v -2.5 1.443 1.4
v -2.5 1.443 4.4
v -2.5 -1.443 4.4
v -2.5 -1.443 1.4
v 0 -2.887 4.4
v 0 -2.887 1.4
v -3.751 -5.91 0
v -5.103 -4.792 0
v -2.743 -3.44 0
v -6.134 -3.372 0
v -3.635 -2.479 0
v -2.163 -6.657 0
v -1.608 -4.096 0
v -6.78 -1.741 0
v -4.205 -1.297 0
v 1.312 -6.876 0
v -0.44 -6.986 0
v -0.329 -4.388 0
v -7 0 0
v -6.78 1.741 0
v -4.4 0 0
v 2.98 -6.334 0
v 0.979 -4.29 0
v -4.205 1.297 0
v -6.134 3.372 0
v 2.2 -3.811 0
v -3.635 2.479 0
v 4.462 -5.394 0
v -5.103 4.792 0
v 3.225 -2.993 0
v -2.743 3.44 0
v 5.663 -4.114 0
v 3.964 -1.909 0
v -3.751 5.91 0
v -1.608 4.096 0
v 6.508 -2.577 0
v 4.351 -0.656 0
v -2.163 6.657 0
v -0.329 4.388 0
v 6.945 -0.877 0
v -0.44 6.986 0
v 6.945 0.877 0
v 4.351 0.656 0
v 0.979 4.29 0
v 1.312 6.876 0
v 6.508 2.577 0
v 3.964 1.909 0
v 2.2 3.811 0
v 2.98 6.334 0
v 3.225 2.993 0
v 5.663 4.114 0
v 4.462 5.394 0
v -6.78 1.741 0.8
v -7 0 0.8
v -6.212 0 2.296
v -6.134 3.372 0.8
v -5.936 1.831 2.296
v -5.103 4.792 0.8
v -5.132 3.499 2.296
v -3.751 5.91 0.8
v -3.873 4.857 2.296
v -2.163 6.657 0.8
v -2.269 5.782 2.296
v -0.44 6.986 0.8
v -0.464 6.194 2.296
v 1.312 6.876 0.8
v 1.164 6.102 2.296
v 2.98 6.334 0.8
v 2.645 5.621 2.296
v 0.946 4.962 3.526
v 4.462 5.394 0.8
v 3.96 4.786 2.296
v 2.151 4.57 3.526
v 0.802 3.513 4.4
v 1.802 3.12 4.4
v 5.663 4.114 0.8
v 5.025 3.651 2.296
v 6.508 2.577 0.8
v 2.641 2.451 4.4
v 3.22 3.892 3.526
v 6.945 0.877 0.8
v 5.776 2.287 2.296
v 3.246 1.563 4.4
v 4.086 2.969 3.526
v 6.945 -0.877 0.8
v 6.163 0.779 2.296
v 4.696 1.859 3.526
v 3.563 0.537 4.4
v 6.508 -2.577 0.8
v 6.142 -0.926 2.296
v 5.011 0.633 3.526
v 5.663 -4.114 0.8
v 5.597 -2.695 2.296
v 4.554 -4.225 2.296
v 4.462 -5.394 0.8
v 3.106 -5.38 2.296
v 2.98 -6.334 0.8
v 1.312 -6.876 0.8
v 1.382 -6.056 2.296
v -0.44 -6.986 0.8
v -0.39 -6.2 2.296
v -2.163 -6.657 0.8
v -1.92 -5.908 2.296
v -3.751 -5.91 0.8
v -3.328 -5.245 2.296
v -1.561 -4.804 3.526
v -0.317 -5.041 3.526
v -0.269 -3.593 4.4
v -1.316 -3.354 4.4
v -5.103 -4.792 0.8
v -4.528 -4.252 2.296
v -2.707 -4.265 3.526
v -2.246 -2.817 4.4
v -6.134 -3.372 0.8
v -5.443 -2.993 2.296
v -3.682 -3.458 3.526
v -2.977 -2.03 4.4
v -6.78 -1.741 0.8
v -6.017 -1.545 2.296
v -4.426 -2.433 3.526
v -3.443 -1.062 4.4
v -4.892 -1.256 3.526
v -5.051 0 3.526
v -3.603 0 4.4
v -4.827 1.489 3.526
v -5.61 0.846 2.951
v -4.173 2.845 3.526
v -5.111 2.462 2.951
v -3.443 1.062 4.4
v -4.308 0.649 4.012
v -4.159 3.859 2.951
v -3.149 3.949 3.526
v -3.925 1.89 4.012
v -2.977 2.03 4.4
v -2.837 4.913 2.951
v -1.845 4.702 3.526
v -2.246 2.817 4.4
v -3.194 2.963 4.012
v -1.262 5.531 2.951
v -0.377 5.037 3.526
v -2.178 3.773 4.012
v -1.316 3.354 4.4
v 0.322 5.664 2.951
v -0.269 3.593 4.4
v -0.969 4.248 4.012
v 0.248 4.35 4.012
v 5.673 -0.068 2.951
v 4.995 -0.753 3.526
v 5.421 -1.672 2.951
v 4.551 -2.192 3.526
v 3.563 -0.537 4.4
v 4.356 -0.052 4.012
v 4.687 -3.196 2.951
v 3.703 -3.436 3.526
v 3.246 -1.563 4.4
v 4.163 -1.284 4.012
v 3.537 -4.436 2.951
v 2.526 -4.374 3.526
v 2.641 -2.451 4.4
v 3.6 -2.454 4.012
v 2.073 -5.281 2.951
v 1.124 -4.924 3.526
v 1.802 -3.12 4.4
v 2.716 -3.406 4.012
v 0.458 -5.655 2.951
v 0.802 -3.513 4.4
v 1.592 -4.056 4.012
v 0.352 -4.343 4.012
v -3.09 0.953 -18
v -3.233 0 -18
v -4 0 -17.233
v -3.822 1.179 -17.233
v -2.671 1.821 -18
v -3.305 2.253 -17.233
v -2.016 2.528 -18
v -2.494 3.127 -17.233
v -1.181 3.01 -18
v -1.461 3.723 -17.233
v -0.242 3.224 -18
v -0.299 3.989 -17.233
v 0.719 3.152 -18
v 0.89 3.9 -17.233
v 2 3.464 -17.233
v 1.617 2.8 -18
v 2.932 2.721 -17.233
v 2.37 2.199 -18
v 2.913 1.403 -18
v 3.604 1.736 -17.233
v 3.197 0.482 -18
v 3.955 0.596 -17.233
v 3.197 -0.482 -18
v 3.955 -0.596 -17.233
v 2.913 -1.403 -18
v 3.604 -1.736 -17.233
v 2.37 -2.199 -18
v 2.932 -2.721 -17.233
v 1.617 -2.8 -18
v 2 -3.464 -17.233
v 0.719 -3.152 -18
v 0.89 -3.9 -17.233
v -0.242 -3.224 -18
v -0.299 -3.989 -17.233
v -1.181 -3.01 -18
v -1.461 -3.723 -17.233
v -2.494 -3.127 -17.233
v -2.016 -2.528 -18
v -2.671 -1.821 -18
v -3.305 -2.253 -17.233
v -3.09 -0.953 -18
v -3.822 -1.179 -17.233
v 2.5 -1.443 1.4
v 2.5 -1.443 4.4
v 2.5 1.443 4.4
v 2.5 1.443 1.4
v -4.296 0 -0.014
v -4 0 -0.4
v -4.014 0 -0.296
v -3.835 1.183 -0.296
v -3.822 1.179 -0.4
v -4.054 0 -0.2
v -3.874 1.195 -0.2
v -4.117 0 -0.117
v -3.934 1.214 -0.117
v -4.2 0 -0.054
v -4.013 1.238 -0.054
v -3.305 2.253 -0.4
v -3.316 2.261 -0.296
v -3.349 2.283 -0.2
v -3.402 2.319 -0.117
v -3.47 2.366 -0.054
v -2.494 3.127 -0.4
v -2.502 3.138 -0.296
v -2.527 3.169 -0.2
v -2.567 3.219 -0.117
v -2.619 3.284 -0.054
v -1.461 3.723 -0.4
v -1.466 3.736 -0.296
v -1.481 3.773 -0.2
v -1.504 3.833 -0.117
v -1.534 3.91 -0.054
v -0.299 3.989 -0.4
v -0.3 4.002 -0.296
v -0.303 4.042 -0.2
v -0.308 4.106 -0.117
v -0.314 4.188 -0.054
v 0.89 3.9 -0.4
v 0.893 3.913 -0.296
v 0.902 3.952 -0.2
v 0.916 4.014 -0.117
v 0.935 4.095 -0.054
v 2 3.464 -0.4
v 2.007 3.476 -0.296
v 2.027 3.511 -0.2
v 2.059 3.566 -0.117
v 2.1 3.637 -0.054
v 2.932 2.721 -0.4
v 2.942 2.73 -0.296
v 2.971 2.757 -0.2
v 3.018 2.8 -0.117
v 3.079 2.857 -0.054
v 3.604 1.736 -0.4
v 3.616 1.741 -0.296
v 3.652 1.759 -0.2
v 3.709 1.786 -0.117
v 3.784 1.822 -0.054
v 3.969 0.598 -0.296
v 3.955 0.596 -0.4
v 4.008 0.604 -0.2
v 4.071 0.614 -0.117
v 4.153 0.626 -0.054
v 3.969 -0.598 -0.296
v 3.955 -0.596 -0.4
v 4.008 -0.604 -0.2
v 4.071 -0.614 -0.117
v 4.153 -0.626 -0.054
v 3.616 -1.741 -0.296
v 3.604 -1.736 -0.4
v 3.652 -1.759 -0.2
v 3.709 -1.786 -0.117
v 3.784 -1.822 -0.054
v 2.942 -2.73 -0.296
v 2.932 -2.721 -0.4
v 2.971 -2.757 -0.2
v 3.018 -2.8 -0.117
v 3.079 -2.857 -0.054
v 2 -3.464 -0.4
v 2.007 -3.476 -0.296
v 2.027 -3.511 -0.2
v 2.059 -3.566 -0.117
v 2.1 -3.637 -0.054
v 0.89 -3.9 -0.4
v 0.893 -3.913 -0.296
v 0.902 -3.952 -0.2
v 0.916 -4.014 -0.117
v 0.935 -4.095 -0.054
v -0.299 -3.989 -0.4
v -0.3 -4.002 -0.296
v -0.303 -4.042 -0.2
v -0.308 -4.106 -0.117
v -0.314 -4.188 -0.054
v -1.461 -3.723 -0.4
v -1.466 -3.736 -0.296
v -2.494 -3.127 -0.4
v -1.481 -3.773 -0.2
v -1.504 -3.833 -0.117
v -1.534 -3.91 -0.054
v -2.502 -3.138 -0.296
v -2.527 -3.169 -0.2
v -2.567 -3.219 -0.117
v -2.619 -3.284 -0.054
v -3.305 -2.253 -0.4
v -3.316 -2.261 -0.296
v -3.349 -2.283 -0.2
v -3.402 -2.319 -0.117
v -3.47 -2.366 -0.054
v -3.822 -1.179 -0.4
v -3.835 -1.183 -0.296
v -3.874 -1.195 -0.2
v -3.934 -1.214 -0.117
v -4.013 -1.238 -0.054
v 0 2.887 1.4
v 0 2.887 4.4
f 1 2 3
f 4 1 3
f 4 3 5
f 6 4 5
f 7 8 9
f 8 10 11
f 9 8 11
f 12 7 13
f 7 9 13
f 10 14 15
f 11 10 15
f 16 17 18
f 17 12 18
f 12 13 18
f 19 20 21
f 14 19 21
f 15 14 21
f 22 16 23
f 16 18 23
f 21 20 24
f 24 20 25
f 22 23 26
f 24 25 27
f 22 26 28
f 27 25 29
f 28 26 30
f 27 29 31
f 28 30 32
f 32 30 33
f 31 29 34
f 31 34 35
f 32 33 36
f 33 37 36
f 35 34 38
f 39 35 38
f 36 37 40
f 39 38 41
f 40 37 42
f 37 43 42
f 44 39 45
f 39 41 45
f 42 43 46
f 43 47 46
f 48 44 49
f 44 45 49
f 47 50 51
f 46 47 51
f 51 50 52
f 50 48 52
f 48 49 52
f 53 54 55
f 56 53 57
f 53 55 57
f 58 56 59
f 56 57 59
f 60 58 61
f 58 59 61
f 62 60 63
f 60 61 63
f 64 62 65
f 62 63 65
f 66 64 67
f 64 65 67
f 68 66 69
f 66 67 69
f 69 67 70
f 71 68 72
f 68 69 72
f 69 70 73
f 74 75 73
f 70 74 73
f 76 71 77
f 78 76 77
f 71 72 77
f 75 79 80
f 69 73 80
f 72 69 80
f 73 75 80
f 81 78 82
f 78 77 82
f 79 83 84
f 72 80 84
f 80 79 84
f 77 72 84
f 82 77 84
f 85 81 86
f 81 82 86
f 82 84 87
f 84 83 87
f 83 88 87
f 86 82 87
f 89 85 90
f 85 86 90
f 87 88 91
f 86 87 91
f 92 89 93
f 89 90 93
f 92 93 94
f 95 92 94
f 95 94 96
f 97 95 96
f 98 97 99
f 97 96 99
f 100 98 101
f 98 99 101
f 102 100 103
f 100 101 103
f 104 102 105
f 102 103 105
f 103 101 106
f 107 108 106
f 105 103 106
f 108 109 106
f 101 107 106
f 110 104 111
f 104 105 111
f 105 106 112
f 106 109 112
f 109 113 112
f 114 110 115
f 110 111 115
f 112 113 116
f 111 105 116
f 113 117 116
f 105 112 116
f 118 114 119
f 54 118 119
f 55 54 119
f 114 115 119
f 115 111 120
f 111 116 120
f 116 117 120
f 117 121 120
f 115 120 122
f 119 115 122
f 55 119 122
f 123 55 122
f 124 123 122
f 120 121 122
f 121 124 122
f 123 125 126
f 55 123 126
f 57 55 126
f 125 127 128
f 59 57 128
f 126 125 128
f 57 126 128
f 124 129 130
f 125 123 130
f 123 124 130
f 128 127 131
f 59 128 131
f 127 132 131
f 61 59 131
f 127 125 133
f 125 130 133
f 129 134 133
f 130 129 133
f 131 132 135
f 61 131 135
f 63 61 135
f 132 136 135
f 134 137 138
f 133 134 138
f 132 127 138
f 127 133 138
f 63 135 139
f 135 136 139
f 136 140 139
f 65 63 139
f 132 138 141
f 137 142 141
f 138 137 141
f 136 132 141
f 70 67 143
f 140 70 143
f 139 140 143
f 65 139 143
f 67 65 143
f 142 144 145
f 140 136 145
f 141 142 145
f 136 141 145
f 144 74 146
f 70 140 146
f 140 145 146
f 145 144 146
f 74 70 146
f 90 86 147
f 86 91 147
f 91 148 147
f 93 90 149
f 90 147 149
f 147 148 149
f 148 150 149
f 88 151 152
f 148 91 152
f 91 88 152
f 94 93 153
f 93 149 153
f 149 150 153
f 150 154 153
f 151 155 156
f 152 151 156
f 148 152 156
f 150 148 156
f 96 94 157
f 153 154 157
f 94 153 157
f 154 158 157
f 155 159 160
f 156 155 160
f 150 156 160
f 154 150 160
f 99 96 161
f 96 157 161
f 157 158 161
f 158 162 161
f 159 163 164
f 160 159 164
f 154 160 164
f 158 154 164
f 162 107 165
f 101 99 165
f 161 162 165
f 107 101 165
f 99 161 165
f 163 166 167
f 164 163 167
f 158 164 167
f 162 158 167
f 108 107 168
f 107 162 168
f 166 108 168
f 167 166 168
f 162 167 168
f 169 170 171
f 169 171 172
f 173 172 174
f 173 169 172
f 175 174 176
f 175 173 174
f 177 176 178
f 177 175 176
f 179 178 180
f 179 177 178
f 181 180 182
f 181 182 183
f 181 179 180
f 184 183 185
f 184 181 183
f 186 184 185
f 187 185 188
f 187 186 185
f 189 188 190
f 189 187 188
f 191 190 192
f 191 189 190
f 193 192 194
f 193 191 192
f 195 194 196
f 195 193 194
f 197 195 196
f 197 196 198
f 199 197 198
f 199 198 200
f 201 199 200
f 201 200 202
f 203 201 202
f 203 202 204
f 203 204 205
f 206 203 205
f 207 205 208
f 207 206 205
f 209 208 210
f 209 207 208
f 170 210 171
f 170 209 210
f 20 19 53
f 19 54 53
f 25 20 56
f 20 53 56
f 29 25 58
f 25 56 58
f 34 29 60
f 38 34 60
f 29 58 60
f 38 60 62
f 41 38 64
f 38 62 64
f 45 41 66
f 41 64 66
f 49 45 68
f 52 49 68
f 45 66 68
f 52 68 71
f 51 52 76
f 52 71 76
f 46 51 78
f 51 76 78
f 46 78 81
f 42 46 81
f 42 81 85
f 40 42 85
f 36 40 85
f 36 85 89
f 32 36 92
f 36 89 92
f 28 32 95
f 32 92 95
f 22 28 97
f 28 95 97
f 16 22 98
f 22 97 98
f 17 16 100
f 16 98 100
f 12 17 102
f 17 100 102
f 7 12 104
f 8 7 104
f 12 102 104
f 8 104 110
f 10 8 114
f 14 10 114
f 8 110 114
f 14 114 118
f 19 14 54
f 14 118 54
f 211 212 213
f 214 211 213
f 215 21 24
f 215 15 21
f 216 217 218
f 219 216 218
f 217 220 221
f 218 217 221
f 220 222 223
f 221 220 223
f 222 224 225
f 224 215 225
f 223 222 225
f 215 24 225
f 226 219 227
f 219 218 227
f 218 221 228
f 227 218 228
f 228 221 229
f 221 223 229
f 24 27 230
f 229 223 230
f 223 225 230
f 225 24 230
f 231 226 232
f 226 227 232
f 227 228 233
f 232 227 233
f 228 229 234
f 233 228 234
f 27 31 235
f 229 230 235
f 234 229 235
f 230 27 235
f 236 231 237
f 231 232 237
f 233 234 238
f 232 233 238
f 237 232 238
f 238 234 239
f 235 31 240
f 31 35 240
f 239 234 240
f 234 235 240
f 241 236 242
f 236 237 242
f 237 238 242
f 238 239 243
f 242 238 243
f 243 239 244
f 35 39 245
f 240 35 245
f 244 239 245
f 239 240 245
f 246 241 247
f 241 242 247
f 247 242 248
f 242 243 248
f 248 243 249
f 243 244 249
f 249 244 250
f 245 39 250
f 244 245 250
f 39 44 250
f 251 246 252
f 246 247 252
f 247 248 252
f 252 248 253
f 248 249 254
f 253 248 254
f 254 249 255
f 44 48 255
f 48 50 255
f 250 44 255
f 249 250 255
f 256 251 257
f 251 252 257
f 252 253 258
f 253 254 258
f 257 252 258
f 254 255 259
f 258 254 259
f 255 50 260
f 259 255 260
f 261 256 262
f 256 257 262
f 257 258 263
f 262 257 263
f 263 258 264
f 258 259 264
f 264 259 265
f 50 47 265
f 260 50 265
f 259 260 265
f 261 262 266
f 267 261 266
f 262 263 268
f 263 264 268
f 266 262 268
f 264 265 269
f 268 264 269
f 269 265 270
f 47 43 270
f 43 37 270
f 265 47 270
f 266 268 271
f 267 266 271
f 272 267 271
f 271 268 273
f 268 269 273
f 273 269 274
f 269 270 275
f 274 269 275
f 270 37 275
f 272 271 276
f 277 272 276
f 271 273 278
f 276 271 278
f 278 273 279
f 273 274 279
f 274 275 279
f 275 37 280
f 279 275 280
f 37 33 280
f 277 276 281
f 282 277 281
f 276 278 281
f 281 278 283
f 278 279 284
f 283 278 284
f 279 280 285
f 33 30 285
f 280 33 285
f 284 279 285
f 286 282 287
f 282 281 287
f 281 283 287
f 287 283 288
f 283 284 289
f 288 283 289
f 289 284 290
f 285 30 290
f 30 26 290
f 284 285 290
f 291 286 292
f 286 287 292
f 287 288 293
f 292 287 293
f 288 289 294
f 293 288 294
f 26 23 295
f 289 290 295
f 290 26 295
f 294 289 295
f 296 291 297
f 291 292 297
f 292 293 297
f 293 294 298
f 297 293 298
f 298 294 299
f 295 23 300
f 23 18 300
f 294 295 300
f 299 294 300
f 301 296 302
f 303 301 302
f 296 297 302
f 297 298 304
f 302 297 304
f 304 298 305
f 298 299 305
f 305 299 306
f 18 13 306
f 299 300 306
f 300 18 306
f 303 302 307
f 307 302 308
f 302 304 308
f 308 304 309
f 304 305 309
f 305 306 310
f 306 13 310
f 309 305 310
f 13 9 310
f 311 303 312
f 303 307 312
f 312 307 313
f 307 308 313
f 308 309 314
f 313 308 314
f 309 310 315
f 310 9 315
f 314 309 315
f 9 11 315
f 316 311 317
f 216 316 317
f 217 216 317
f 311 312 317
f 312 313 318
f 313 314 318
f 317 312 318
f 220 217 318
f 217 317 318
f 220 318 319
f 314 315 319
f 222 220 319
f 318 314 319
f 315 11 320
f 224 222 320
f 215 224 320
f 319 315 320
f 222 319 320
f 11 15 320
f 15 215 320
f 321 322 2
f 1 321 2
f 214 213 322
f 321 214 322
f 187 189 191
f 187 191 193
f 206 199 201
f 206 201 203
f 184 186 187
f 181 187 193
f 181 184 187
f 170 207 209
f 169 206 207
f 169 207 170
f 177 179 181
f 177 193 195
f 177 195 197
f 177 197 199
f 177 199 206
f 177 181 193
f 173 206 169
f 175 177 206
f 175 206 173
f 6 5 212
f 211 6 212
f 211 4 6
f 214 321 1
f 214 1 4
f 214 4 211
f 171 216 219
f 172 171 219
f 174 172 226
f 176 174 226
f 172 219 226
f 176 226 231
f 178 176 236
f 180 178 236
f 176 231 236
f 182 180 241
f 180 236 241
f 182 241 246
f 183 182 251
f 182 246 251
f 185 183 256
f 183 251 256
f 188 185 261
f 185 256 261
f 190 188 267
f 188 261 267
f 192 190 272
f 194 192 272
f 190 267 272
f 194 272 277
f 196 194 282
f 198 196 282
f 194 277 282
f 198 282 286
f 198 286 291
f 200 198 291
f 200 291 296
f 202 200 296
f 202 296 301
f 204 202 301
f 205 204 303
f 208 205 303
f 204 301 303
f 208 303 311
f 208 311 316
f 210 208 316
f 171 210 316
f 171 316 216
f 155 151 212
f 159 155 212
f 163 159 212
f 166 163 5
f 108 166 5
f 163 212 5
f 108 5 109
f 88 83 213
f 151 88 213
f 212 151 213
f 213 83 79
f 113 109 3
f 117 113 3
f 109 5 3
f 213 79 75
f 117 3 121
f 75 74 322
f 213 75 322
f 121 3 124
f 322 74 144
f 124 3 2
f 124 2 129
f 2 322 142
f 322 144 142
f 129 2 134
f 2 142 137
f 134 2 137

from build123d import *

# Parameters (mm, degrees)
SKETCH2_R           = 4
BOSS_EXTRUDE1_DEPTH = 18
CUT_EXTRUDE1_DEPTH  = 3
CHAMFER1_SIZE       = 0.7668
FILLET1_R           = 0.4


with BuildPart() as part:
    # Sketch1 → Revolve1 (revolve)
    with BuildSketch(Plane.XZ, mode=Mode.PRIVATE) as revolve1_sk:
        with BuildLine():
            Line((3.603028, 4.4), (0, 4.4))
            Line((0, 4.4), (0, 0))
            Line((0, 0), (7, 0))
            Line((7, 0), (7, 0.8))
            ThreePointArc((7, 0.8), (5.673259557, 2.950780347), (3.603028, 4.4))
        make_face()
    revolve(revolve1_sk.sketch.rotate(Axis((0, 0, 4.4), (0, 0, -1)), 180), axis=Axis((0, 0, 4.4), (0, 0, -1)))

    # Sketch2 → Boss-Extrude1 (add)
    with BuildSketch(Plane(origin=(0, 0, 0), x_dir=(-1, 0, 0), z_dir=(0, 0, -1))):
        Circle(SKETCH2_R)
    extrude(amount=BOSS_EXTRUDE1_DEPTH)

    # Sketch3 → Cut-Extrude1 (cut)
    with BuildSketch(Plane.XY.offset(4.4)):
        Polygon((2.5, -1.443375673), (2.5, 1.443375673), (0, 2.886751346), (-2.5, 1.443375673), (-2.5, -1.443375673), (0, -2.886751346), align=None)
    extrude(amount=-CUT_EXTRUDE1_DEPTH, mode=Mode.SUBTRACT)

    # Chamfer1
    chamfer1_edges = [part.edges().sort_by_distance(p)[0] for p in [
        (4, 0, -18),
    ]]
    chamfer(chamfer1_edges, length=CHAMFER1_SIZE)

    # Fillet1
    fillet1_edges = [part.edges().sort_by_distance(p)[0] for p in [
        (4, 0, 0),
    ]]
    fillet(fillet1_edges, radius=FILLET1_R)


solid = part.part
